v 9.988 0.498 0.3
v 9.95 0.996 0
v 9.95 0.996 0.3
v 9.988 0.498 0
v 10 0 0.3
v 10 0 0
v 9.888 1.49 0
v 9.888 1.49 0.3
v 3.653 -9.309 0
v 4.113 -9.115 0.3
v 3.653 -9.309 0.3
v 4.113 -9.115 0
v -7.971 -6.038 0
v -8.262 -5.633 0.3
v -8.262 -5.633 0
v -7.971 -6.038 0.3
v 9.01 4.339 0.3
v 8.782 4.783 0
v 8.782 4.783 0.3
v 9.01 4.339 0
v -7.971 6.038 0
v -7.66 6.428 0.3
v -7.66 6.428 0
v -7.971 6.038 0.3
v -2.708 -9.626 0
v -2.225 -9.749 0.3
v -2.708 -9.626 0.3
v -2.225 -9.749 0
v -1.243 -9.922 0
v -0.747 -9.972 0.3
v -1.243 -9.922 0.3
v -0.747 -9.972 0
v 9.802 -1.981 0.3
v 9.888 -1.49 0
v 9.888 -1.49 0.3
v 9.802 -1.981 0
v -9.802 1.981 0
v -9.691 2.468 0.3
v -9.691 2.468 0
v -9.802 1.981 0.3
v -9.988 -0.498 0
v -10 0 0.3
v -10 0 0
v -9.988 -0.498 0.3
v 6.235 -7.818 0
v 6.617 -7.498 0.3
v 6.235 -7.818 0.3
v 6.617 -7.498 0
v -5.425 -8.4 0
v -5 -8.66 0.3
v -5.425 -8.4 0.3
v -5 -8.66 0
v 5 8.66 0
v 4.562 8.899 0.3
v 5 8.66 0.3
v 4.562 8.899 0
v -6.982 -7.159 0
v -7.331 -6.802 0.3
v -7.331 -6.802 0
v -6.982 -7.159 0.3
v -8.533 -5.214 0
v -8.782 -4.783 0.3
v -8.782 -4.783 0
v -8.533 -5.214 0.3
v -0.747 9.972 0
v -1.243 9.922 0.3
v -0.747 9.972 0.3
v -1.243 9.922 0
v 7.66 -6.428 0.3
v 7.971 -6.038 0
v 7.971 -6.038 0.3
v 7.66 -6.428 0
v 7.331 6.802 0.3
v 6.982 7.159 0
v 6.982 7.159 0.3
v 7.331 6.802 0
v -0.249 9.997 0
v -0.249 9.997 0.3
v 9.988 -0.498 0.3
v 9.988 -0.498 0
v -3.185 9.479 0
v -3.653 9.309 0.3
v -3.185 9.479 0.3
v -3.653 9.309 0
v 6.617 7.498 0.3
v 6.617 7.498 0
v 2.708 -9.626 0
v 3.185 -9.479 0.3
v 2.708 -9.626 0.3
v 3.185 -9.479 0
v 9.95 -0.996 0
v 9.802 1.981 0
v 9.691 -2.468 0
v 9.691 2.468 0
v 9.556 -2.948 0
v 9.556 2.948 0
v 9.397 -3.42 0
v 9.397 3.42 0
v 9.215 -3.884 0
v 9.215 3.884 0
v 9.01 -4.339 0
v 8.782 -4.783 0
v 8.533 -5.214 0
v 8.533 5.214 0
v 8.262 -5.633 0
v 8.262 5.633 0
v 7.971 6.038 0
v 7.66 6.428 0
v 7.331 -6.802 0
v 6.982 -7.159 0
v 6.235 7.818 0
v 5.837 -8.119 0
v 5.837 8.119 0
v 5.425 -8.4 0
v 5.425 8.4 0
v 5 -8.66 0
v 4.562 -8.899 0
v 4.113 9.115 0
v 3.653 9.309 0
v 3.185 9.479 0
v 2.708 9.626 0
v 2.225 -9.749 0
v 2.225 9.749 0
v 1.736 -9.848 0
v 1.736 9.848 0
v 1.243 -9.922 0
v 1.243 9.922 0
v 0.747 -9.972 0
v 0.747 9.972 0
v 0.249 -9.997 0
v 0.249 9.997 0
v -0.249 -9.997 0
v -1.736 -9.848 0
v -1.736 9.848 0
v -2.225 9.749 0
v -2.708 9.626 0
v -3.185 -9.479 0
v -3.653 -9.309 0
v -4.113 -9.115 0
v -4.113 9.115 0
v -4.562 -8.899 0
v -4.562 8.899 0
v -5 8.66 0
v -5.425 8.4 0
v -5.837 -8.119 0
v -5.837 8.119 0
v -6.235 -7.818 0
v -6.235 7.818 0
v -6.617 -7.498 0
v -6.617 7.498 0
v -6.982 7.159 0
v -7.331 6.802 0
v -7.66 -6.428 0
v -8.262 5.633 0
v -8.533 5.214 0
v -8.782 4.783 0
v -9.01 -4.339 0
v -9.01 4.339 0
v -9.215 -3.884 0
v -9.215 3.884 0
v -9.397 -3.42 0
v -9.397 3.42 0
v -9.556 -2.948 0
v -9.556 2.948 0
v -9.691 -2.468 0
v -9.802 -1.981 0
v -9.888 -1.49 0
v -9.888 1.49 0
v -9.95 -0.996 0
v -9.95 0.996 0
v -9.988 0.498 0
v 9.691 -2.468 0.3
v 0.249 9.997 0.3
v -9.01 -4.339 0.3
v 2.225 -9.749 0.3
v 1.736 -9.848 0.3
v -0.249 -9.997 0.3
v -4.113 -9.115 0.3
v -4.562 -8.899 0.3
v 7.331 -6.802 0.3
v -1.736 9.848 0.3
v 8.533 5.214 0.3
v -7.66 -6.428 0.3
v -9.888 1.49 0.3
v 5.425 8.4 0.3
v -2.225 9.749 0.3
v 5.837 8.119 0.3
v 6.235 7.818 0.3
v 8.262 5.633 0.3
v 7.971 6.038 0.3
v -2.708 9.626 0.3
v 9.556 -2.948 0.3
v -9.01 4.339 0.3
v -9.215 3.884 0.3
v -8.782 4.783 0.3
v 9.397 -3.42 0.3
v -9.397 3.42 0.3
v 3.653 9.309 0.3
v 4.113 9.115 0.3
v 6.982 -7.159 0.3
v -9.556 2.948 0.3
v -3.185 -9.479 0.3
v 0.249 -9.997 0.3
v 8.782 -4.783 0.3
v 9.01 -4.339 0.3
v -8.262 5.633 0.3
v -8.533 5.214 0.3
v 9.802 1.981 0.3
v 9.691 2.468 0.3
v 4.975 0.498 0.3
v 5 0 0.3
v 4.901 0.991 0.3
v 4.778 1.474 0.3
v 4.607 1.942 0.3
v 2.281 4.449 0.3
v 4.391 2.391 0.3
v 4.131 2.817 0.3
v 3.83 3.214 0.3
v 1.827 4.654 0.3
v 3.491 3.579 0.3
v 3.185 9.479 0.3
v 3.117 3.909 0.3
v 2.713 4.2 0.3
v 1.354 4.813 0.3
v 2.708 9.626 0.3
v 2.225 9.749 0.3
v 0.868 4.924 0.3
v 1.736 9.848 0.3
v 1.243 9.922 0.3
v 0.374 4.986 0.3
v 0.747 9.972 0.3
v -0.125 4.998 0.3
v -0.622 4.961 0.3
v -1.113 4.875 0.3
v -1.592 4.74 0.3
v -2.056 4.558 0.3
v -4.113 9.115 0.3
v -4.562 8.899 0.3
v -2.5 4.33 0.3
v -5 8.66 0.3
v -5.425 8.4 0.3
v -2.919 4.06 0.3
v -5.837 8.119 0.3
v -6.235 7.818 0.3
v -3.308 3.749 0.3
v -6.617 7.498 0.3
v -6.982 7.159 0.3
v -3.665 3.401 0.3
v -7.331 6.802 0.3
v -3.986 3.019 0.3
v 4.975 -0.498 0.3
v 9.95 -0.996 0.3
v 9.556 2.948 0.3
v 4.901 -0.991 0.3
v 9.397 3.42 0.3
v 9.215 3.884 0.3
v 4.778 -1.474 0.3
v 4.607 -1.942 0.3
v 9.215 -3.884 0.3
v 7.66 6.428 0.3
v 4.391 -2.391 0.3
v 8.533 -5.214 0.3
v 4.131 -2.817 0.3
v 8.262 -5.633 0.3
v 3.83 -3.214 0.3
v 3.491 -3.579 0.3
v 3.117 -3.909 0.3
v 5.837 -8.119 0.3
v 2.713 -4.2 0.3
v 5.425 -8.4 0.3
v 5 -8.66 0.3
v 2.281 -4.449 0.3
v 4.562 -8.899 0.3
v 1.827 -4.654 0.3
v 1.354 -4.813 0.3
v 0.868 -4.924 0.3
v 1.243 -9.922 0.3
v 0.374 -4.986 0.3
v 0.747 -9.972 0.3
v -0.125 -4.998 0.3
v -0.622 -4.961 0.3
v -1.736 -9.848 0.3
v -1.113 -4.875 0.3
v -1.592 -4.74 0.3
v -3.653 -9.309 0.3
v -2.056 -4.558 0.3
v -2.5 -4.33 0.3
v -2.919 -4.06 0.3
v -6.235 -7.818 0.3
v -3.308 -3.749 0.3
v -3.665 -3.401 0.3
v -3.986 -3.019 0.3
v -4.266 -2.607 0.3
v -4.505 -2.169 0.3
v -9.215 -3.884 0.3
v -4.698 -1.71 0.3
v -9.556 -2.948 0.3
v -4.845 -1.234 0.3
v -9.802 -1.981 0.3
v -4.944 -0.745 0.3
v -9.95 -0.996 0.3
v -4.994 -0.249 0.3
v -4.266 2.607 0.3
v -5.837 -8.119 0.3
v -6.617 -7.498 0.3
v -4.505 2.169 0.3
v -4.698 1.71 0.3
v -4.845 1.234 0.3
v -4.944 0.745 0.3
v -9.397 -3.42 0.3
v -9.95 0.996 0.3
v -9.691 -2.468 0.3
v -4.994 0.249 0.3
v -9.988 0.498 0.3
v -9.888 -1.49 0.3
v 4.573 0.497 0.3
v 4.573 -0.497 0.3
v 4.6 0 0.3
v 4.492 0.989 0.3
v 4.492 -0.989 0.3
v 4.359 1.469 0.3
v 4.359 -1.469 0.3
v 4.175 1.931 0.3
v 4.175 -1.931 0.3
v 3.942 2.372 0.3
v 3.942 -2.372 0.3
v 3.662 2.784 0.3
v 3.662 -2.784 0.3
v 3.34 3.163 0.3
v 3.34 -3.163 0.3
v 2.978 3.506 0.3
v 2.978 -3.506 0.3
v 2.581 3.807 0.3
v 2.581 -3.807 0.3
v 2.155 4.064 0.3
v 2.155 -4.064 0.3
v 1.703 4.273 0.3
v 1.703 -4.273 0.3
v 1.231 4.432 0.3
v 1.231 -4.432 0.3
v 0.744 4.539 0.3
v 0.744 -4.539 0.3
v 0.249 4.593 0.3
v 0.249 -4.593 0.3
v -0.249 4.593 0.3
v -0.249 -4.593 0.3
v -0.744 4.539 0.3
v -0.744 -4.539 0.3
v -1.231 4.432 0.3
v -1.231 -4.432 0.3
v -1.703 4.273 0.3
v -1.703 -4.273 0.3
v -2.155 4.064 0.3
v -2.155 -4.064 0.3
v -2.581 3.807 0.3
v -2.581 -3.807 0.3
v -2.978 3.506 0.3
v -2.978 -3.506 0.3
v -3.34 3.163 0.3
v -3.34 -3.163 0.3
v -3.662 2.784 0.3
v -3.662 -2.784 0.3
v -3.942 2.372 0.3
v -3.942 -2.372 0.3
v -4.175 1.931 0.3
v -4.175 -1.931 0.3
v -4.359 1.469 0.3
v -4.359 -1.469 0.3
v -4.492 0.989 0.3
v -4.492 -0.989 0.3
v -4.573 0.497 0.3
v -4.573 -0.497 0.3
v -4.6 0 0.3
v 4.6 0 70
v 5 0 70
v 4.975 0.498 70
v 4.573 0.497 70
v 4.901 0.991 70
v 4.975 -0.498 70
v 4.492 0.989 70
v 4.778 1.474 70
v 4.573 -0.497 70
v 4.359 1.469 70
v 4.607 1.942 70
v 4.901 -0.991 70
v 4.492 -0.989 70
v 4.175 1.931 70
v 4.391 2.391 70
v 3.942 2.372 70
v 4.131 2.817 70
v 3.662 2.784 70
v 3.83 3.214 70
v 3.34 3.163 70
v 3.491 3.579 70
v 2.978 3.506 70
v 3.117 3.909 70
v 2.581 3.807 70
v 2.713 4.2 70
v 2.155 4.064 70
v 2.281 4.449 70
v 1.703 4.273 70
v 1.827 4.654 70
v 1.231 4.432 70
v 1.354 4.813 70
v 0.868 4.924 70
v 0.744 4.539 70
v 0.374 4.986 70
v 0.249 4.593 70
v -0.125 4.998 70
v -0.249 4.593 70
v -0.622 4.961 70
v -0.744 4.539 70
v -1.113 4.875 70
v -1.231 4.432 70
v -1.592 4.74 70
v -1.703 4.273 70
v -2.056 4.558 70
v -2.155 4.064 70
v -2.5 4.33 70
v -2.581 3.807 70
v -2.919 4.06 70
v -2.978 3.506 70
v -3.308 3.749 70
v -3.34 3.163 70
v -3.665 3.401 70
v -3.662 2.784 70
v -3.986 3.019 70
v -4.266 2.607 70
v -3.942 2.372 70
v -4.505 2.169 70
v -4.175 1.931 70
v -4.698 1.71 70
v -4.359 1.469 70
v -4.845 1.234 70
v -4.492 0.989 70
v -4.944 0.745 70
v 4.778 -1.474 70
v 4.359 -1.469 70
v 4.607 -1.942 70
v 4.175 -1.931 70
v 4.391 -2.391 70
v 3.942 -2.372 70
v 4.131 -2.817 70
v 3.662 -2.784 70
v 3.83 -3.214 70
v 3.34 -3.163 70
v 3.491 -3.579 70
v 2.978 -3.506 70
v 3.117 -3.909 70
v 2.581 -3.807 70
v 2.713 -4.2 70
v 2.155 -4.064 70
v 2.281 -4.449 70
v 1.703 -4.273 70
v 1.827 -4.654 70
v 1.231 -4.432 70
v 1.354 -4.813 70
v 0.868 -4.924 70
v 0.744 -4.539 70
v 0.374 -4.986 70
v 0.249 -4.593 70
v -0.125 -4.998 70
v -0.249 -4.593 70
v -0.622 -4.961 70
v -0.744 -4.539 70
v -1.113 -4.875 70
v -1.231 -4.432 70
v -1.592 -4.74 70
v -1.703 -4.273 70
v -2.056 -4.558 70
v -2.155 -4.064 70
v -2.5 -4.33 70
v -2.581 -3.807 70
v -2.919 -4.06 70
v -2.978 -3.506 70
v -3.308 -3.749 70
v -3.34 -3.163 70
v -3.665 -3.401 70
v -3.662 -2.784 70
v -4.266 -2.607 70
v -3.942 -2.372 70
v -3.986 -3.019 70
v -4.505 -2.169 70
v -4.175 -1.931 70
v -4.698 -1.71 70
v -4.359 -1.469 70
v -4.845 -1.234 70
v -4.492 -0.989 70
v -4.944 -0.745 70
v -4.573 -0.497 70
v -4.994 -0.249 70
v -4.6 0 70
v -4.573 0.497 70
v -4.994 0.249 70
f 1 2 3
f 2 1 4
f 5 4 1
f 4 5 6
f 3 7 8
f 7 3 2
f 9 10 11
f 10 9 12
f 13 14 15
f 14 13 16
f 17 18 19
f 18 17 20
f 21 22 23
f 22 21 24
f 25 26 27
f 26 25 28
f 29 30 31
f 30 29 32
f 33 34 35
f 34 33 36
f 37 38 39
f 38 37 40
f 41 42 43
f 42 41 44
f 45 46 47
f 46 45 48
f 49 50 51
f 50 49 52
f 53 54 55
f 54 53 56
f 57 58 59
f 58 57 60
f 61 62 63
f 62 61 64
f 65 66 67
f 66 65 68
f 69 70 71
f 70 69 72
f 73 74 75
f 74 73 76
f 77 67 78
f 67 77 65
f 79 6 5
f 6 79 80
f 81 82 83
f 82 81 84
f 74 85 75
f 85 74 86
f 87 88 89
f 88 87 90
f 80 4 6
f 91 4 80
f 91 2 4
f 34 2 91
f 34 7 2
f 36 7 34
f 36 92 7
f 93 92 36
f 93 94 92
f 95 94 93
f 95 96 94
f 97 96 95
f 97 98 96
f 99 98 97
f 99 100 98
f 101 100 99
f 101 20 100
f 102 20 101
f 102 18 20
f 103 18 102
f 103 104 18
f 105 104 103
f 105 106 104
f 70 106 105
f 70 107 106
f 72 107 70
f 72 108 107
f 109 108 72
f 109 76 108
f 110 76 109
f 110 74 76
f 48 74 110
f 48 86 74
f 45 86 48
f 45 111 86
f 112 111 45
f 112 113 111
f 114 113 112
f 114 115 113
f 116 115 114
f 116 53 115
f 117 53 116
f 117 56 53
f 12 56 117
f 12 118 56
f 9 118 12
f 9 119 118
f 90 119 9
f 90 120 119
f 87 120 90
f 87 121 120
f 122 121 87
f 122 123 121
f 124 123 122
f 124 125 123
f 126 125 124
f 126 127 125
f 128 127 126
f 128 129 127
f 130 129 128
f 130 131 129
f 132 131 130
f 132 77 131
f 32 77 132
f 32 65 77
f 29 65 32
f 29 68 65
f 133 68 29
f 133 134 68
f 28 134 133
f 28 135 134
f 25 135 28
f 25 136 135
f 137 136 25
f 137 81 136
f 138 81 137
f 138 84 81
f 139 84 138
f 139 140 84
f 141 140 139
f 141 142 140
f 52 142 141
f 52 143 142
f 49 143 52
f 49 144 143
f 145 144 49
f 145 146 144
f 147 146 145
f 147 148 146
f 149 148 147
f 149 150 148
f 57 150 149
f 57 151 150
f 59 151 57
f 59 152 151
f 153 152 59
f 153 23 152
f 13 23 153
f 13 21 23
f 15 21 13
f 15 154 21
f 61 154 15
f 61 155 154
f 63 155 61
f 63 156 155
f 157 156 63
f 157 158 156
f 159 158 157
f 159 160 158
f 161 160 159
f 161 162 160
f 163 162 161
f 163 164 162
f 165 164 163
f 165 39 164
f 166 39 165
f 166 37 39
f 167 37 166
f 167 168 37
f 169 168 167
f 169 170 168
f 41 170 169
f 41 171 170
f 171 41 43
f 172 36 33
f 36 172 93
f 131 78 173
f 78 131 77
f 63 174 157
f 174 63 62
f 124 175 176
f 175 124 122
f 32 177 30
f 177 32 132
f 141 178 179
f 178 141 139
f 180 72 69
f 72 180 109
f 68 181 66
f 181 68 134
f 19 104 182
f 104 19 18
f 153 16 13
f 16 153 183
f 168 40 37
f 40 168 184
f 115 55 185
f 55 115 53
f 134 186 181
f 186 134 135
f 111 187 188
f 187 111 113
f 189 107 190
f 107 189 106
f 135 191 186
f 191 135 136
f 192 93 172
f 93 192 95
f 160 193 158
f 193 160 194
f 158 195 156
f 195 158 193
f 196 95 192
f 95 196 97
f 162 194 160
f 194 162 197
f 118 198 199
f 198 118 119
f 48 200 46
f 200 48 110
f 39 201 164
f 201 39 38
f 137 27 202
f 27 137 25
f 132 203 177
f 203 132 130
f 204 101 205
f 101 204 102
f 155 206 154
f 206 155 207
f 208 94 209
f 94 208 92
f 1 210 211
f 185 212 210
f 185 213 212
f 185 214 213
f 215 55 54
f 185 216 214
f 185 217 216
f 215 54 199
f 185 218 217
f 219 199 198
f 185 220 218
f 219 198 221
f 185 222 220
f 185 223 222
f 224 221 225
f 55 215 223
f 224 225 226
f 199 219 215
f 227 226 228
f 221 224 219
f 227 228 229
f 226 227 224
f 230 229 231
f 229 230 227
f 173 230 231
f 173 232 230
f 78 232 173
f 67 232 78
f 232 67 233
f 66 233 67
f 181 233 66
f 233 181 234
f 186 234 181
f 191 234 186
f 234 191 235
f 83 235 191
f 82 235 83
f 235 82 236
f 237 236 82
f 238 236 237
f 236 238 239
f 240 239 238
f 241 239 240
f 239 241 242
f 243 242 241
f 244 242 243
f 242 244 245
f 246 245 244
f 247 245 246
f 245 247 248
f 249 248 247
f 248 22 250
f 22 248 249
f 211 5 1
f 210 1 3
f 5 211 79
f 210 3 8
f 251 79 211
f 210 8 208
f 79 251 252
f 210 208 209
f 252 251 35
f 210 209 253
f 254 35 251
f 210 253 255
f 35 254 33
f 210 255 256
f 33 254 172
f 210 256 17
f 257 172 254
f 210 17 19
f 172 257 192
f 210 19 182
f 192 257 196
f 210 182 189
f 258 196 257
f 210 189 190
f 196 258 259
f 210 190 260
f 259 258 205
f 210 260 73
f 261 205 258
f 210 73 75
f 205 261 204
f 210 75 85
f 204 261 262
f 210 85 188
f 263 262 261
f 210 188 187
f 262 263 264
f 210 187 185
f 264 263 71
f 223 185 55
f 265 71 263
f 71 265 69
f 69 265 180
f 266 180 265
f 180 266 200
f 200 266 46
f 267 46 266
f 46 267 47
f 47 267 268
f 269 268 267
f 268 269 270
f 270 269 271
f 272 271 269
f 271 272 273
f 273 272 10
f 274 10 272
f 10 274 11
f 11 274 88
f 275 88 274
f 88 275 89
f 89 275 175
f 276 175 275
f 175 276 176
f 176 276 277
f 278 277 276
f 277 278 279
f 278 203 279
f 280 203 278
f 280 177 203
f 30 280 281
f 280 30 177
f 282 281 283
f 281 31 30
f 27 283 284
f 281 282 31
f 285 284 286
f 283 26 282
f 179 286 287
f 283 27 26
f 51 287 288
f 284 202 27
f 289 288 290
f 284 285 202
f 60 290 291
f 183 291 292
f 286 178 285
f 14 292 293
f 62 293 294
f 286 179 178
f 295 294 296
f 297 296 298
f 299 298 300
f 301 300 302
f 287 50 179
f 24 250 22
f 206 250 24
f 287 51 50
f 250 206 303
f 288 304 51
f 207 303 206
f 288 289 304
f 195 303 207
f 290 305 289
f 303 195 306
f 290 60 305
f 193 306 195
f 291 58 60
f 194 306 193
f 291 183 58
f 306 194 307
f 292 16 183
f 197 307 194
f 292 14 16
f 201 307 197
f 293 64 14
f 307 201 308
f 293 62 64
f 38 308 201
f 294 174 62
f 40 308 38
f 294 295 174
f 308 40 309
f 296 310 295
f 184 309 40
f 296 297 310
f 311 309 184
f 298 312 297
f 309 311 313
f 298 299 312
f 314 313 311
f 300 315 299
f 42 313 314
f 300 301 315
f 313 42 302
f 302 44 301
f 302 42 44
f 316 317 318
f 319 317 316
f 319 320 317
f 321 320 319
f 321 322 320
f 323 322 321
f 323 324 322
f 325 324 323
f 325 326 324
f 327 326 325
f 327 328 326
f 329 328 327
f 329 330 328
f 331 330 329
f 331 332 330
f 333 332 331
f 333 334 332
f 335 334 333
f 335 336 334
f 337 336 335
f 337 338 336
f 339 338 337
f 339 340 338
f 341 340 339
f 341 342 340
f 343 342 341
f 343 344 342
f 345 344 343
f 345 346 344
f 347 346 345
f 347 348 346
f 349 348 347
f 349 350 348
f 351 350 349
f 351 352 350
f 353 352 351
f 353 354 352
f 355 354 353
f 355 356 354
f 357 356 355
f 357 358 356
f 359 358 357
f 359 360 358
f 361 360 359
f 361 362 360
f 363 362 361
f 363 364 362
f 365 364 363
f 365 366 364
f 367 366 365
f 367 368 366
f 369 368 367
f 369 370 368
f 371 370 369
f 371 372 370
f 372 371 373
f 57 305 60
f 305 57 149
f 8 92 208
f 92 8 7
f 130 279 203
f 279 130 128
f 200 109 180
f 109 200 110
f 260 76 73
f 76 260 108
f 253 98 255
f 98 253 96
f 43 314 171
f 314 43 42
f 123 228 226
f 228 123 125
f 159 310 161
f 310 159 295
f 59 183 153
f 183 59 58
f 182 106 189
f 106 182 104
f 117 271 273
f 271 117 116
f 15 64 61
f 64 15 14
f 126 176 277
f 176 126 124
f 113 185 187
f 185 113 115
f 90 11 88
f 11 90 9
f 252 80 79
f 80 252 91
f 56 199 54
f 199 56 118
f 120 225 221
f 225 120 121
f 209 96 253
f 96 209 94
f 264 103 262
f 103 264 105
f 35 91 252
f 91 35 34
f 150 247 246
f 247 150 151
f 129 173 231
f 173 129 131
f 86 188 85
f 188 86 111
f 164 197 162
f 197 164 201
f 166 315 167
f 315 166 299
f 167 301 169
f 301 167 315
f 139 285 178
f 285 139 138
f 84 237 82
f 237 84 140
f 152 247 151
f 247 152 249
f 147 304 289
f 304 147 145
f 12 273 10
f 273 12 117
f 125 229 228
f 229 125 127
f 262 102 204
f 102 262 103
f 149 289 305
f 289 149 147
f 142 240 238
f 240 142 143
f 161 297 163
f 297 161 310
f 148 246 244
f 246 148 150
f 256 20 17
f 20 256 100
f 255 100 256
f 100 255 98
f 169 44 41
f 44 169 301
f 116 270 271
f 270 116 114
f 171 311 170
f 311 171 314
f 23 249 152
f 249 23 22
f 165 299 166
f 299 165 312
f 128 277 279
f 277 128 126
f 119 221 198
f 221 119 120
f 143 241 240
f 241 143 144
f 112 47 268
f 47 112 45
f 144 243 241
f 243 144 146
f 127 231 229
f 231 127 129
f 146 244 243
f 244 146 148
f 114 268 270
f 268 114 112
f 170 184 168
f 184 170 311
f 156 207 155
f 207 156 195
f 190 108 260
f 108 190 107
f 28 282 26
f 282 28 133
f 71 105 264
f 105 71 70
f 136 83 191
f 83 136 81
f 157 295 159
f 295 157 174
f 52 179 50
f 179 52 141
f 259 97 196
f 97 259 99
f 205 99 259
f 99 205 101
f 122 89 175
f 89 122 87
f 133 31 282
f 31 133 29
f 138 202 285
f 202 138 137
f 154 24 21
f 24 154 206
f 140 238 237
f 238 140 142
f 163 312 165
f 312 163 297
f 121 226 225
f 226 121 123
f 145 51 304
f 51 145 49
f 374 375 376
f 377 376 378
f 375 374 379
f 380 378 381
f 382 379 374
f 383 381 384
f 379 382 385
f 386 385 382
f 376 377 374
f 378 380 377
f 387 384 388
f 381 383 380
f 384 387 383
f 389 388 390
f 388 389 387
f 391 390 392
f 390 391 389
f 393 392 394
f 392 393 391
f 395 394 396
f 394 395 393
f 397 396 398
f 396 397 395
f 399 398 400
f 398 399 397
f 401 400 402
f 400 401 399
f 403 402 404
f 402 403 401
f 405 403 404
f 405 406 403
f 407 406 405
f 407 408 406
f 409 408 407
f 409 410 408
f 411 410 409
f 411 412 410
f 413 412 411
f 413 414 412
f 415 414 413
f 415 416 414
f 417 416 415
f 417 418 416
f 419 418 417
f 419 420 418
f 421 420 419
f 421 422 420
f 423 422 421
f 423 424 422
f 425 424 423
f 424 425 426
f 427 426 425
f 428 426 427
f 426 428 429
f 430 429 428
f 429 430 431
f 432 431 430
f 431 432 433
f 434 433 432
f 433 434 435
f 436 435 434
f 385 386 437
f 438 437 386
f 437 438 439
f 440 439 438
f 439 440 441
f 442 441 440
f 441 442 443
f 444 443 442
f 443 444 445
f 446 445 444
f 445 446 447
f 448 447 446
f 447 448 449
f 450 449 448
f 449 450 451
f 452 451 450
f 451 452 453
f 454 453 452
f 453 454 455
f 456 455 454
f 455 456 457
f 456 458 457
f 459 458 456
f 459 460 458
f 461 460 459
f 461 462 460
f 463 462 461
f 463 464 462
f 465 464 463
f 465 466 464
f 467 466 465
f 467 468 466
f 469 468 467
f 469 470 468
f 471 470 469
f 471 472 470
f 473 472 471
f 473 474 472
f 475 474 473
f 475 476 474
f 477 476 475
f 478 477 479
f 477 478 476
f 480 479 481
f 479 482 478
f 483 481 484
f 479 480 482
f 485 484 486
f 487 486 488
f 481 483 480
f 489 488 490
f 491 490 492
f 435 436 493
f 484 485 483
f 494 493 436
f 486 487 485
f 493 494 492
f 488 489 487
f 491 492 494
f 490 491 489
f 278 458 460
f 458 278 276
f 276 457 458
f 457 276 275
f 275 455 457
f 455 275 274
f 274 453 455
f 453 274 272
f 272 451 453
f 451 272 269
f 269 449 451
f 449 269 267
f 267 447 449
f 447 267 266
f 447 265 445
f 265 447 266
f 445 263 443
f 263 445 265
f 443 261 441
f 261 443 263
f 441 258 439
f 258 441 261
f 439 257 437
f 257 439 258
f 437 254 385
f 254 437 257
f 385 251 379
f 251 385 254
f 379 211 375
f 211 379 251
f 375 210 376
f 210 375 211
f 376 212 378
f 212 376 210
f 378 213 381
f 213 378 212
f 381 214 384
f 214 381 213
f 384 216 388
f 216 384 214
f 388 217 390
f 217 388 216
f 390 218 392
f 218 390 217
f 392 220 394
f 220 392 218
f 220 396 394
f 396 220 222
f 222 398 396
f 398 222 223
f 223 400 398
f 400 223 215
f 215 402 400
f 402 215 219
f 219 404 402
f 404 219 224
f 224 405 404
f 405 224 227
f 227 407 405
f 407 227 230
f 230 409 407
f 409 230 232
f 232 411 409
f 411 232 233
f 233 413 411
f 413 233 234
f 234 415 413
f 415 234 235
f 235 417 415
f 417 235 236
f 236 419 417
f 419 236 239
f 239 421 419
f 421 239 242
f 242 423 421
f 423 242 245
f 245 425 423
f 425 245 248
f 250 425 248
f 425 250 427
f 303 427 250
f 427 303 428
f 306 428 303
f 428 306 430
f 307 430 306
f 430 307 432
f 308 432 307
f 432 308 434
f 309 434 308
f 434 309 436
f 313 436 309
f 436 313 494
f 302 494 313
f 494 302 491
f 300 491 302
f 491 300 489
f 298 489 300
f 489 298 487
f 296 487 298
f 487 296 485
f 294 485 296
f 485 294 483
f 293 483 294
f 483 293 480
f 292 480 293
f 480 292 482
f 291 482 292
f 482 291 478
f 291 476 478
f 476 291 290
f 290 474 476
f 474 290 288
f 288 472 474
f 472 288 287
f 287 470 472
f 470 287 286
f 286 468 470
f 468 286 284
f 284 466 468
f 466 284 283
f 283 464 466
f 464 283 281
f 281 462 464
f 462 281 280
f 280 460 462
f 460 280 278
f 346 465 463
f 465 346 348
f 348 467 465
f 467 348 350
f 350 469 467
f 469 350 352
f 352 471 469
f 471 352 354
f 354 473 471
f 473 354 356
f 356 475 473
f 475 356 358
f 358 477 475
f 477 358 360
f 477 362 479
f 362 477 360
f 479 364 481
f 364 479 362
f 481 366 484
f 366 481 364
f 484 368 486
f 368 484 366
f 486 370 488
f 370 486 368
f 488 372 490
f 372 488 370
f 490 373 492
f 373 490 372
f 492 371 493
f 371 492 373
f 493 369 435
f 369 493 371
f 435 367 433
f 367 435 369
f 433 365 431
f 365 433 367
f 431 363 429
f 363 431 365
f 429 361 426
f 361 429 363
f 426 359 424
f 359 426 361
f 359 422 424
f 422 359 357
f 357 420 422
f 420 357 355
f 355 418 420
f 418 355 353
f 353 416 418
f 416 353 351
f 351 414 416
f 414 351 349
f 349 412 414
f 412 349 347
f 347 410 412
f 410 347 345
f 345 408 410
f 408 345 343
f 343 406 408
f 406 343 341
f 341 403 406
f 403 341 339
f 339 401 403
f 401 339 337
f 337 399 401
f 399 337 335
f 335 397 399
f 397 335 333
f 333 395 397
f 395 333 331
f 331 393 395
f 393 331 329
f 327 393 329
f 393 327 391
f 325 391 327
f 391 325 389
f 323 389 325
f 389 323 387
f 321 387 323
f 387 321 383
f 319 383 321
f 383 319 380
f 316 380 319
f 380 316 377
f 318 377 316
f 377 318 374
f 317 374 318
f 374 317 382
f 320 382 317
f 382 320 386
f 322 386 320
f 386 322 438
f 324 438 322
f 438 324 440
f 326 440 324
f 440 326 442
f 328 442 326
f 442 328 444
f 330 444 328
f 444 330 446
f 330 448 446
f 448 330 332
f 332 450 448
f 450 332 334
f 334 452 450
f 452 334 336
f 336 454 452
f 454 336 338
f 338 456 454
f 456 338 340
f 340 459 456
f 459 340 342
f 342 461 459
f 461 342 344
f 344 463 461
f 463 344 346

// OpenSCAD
$fs = 0.5;
$fa = 1;

pillar_h = 70;

cylinder (d=20, h=0.3);

linear_extrude (height = pillar_h)
difference () {
    circle (d=10);
    circle (d=10 - 0.4 * 2);
}
